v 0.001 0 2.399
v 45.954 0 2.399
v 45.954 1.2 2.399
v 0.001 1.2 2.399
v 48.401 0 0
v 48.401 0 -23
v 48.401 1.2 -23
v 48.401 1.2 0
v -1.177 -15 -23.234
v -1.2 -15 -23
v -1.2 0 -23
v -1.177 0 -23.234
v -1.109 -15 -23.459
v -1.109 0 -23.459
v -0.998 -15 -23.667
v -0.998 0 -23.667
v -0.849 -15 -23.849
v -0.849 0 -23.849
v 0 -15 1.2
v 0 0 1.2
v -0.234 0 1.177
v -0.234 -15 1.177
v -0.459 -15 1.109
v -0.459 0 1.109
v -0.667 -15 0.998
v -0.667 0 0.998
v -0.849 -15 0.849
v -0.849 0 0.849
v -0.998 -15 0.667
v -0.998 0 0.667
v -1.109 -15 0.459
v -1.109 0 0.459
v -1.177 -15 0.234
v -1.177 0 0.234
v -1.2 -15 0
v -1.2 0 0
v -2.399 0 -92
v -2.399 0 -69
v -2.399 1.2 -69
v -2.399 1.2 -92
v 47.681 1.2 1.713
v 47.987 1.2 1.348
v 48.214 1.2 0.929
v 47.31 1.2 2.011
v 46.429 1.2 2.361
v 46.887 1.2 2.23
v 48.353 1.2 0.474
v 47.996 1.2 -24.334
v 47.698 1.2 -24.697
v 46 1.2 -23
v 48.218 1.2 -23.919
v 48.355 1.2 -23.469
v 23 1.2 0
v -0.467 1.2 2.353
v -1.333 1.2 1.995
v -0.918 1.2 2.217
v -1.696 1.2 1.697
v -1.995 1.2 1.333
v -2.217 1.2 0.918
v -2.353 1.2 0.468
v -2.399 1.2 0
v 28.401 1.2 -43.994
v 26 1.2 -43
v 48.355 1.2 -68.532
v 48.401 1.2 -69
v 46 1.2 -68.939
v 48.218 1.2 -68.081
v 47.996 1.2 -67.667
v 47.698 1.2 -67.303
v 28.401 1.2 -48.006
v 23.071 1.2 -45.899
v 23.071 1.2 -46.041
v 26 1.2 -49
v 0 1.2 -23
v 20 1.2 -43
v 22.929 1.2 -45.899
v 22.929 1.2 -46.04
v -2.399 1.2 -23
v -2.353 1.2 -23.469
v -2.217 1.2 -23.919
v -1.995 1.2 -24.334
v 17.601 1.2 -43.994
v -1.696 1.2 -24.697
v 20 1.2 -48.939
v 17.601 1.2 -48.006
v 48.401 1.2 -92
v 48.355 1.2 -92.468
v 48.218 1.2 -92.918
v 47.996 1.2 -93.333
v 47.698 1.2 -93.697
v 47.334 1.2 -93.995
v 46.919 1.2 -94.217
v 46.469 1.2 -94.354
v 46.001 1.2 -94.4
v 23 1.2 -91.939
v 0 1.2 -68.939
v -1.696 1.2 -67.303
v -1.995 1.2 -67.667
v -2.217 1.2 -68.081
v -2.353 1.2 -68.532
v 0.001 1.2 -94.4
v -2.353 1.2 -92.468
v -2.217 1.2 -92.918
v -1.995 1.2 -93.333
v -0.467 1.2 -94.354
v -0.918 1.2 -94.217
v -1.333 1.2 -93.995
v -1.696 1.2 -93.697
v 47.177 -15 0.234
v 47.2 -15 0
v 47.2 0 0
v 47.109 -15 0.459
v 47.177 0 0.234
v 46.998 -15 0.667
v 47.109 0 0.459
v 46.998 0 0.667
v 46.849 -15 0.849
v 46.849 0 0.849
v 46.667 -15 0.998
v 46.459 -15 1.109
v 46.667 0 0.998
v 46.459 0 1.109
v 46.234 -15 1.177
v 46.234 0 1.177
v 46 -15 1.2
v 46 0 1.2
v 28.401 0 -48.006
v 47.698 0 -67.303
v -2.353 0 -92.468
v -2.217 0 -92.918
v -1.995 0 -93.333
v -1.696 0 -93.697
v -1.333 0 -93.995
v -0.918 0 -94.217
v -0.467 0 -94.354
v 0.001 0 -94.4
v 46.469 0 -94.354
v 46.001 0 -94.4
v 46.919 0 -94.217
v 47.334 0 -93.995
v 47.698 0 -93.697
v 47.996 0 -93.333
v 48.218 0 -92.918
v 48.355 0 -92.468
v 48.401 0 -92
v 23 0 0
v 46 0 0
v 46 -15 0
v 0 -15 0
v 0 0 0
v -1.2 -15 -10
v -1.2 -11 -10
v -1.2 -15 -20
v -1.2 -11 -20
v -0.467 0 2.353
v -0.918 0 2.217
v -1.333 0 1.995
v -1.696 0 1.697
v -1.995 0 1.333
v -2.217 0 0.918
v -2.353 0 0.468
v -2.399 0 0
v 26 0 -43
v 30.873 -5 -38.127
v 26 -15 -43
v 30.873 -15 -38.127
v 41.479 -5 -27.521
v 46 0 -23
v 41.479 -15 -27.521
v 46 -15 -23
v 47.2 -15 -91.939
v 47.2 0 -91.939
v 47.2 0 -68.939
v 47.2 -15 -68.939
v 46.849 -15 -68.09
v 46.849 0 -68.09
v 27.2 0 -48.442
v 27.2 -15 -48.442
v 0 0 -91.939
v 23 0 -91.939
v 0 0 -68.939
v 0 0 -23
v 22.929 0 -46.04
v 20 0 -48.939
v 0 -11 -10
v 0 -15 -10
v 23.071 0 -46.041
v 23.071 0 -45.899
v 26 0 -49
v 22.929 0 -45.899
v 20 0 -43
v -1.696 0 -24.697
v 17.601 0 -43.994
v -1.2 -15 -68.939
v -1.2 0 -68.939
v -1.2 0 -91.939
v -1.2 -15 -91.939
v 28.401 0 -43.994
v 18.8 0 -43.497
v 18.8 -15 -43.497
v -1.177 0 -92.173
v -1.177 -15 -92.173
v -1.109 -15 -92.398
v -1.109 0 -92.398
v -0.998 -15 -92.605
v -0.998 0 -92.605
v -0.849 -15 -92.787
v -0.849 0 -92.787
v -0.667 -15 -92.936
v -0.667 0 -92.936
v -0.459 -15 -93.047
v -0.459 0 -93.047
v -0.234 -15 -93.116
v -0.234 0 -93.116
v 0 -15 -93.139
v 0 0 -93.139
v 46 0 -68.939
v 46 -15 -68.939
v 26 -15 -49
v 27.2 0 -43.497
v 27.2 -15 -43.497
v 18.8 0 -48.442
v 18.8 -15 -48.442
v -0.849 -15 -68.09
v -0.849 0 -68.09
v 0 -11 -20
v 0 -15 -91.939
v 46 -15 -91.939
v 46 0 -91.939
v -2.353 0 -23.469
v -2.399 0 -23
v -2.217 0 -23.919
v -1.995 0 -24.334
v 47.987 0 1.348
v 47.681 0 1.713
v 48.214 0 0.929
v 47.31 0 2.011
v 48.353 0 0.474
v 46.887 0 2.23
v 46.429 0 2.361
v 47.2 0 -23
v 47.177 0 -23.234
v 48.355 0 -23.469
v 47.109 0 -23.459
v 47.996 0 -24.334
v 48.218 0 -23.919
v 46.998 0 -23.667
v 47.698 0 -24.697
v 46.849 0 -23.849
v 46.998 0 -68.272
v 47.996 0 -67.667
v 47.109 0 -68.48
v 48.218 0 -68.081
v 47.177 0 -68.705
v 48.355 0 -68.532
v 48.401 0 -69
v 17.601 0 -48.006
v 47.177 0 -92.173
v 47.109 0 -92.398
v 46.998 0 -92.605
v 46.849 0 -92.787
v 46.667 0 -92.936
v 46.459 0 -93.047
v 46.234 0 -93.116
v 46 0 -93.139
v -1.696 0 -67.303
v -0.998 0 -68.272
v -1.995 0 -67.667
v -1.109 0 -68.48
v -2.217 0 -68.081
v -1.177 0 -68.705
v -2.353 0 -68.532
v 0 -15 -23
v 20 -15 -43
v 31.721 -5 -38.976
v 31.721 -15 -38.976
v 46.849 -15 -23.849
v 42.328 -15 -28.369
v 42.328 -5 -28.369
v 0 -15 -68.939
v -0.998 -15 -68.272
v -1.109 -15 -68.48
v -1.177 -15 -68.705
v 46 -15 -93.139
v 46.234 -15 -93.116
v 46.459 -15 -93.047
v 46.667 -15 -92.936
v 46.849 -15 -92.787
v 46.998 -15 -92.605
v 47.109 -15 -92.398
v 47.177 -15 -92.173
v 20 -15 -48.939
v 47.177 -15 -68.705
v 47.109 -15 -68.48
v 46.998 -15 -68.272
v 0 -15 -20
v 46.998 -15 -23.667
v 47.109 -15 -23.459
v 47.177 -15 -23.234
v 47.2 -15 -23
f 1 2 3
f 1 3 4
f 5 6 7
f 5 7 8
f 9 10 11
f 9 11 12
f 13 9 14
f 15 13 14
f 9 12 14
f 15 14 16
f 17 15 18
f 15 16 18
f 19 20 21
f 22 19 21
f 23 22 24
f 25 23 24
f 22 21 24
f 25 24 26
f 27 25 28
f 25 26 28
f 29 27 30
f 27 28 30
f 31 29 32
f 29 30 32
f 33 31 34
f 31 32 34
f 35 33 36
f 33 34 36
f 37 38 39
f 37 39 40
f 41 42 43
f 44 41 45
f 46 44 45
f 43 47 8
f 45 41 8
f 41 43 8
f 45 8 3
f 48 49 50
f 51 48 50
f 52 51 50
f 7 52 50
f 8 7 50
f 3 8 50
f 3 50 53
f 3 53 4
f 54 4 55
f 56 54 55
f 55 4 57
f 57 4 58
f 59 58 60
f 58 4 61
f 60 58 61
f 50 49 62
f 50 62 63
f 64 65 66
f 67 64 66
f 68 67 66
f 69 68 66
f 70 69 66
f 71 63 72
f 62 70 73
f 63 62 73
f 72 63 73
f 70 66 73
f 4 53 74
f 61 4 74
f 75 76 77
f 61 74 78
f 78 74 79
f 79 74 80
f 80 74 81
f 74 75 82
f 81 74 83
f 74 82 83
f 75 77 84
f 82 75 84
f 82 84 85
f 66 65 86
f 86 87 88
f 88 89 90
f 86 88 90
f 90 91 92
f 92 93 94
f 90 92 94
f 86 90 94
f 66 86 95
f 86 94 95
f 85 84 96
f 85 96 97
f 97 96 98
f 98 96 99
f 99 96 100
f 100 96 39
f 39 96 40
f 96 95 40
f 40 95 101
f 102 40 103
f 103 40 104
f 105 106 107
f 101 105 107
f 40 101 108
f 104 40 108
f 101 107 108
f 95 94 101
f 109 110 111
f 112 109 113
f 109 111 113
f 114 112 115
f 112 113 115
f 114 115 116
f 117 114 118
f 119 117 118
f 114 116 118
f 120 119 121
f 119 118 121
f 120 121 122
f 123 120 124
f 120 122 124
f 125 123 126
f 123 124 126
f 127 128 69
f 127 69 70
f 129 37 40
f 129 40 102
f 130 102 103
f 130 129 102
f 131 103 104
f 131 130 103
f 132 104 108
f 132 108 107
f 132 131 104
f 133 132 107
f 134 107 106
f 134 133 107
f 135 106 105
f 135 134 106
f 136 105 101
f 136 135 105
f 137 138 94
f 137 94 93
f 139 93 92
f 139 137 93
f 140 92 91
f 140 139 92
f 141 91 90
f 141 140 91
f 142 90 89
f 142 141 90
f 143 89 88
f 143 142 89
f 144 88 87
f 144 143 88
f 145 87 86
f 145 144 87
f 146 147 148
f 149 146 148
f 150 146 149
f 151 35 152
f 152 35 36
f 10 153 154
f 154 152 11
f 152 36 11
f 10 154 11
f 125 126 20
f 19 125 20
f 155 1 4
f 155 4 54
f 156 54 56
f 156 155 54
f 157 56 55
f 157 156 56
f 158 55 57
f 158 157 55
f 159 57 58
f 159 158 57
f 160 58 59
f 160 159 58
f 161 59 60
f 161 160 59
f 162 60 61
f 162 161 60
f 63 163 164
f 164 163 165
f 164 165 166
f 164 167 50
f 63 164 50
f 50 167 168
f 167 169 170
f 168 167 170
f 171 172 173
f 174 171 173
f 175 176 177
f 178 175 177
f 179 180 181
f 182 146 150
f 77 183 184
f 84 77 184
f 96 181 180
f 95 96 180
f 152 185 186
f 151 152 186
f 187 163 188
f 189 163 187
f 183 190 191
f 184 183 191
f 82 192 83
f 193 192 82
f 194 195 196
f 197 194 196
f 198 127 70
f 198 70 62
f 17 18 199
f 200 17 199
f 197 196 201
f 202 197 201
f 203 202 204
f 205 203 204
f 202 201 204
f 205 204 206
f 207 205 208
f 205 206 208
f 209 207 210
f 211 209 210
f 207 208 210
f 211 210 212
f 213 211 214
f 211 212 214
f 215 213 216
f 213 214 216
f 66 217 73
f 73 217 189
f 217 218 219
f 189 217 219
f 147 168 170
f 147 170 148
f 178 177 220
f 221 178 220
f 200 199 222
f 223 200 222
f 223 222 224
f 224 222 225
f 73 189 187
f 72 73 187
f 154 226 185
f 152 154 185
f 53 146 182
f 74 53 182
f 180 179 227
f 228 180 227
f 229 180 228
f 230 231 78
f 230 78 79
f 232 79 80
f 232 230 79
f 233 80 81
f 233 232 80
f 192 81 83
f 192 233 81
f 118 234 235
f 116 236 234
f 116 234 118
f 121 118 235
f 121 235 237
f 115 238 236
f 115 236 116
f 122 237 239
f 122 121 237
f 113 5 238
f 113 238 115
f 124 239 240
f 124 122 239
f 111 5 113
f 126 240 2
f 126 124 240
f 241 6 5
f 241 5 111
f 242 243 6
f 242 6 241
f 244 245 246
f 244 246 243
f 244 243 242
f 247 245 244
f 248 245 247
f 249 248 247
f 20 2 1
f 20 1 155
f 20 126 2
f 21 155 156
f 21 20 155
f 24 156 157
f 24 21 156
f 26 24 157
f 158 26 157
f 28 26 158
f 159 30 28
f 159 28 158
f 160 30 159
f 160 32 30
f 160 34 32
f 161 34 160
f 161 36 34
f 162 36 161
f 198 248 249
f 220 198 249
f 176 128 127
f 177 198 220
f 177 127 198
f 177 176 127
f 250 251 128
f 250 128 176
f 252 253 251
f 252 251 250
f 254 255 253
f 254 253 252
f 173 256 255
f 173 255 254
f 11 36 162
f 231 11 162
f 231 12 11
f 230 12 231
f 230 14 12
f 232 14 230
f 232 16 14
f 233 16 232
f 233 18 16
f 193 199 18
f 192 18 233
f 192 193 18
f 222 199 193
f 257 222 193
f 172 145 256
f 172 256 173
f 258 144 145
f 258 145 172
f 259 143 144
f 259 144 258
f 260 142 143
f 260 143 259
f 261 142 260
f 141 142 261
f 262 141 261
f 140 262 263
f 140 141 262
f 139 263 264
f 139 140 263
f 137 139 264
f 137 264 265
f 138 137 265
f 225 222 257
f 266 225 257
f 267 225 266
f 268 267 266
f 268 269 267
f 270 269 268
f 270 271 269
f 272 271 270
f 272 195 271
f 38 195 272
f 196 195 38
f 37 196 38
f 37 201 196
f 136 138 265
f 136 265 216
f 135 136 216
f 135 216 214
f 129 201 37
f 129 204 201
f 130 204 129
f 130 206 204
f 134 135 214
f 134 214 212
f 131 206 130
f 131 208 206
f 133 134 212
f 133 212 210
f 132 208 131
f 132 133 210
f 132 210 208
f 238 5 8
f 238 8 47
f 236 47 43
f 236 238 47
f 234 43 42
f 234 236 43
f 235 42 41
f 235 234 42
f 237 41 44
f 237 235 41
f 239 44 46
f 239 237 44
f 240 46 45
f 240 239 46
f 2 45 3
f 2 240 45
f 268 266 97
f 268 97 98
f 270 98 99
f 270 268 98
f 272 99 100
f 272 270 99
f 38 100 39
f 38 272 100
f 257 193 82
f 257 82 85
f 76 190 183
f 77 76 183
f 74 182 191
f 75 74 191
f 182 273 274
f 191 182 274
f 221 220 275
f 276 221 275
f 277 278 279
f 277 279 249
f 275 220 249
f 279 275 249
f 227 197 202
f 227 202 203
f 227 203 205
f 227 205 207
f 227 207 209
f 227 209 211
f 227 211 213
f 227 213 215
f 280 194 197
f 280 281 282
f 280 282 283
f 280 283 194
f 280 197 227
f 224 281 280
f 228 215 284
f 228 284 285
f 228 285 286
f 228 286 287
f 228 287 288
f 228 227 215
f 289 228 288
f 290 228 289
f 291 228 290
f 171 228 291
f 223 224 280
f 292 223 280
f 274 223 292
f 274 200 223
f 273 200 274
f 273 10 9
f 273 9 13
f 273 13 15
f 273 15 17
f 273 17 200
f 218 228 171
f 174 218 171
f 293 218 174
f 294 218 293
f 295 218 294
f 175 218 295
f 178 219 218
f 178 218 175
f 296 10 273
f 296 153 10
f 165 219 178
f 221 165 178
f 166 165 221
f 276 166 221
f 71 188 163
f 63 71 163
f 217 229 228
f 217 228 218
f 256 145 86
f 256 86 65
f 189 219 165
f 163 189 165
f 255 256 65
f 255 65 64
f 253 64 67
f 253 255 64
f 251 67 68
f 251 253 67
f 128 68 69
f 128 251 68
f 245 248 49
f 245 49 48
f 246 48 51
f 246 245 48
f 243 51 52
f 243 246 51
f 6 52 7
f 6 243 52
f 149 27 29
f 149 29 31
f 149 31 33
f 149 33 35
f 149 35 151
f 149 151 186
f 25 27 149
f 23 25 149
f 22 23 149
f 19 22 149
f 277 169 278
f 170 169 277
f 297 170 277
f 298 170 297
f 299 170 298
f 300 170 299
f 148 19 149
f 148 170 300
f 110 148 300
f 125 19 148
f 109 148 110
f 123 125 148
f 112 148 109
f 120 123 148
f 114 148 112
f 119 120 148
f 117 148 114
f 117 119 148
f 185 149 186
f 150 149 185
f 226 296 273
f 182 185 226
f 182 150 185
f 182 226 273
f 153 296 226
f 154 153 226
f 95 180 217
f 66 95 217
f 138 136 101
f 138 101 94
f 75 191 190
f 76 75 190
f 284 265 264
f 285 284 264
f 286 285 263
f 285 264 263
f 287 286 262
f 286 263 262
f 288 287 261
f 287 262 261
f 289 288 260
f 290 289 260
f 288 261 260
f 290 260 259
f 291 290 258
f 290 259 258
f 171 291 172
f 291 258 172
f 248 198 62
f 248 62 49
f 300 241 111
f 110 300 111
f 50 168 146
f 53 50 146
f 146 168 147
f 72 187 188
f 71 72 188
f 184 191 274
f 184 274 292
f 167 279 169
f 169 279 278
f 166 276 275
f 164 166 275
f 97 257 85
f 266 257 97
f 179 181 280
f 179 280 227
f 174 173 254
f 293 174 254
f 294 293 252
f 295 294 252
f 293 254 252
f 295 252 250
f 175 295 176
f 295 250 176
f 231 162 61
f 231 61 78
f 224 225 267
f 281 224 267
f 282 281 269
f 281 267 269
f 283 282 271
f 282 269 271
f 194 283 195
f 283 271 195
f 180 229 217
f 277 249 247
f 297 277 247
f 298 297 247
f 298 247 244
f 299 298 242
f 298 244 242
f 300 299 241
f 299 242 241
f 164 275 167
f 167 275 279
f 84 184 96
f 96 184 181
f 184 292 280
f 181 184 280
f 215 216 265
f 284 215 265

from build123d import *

# Parameters (mm, degrees)
EXTRUDE_2_DEPTH      = 1.2
EXTRUDE_4_DEPTH      = 15
CUT_EXTRUDE_13_REACH = 109.14
CUT_EXTRUDE_15_REACH = 109.14
CUT_EXTRUDE_16_REACH = 109.14
CUT_EXTRUDE_17_REACH = 73.673


with BuildPart() as part:
    # 草图1 → 凸台-拉伸2 (new body)
    with BuildSketch(Plane(origin=(0, 0, 0), x_dir=(1, 0, 0), z_dir=(0, 1, 0))):
        with BuildLine():
            Line((-2.399264051, 68.999900529), (-2.399264051, 91.999900529))
            ThreePointArc((-2.399264051, 91.999900529), (-1.696320326, 93.696956804), (0.000735949, 94.399900529))
            Line((0.000735949, 94.399900529), (46.000735949, 94.399900529))
            ThreePointArc((46.000735949, 94.399900529), (47.697792224, 93.696956804), (48.400735949, 91.999900529))
            Line((48.400735949, 91.999900529), (48.400735949, 68.999900529))
            ThreePointArc((48.400735949, 68.999900529), (48.218046827, 68.081460292), (47.697792224, 67.302844254))
            Line((47.697792224, 67.302844254), (28.40092775, 48.00597978))
            Line((28.40092775, 48.00597978), (28.40092775, 43.99420488))
            Line((28.40092775, 43.99420488), (47.697792224, 24.697340406))
            ThreePointArc((47.697792224, 24.697340406), (48.218046827, 23.918724369), (48.400735949, 23.000284131))
            Line((48.400735949, 23.000284131), (48.400735949, 0.000284131))
            ThreePointArc((48.400735949, 0.000284131), (47.681245751, -1.713158837), (45.954163612, -2.399263955))
            Line((45.954163612, -2.399263955), (0.000735672, -2.399263955))
            ThreePointArc((0.000735672, -2.399263955), (-1.696376241, -1.696695528), (-2.399264051, 0.000284131))
            Line((-2.399264051, 0.000284131), (-2.399264051, 23.000284131))
            ThreePointArc((-2.399264051, 23.000284131), (-2.216574929, 23.918724369), (-1.696320326, 24.697340406))
            Line((-1.696320326, 24.697340406), (17.600544148, 43.99420488))
            Line((17.600544148, 43.99420488), (17.600544148, 48.00597978))
            Line((17.600544148, 48.00597978), (-1.696320326, 67.302844254))
            ThreePointArc((-1.696320326, 67.302844254), (-2.216574929, 68.081460292), (-2.399264051, 68.999900529))
        make_face()
    extrude(amount=EXTRUDE_2_DEPTH)

    # 草图3 → 凸台-拉伸4 (add)
    with BuildSketch(Plane.XZ):
        with BuildLine():
            Line((0, -93.138725211), (46, -93.138725211))
            ThreePointArc((46, -93.138725211), (46.848528137, -92.787253348), (47.2, -91.938725211))
            Line((47.2, -91.938725211), (47.2, -68.938725211))
            ThreePointArc((47.2, -68.938725211), (47.108655439, -68.479505092), (46.848528137, -68.090197073))
            Line((46.848528137, -68.090197073), (27.200191801, -48.441860737))
            Line((27.200191801, -48.441860737), (27.200191801, -43.496864474))
            Line((27.200191801, -43.496864474), (46.848528137, -23.848528137))
            ThreePointArc((46.848528137, -23.848528137), (47.108655439, -23.459220119), (47.2, -23))
            Line((47.2, -23), (47.2, 0))
            ThreePointArc((47.2, 0), (46.848528137, 0.848528137), (46, 1.2))
            Line((46, 1.2), (0, 1.2))
            ThreePointArc((0, 1.2), (-0.848528137, 0.848528137), (-1.2, 0))
            Line((-1.2, 0), (-1.2, -23))
            ThreePointArc((-1.2, -23), (-1.108655439, -23.459220119), (-0.848528137, -23.848528137))
            Line((-0.848528137, -23.848528137), (18.799808199, -43.496864474))
            Line((18.799808199, -43.496864474), (18.799808199, -48.441860737))
            Line((18.799808199, -48.441860737), (-0.848528137, -68.090197073))
            ThreePointArc((-0.848528137, -68.090197073), (-1.108655439, -68.479505092), (-1.2, -68.938725211))
            Line((-1.2, -68.938725211), (-1.2, -91.938725211))
            ThreePointArc((-1.2, -91.938725211), (-0.848528137, -92.787253348), (0, -93.138725211))
        make_face()
        Polygon((0, -23), (19.999808199, -42.999808199), (19.999808199, -48.938917012), (0, -68.938725211), (0, -91.938725211), (46, -91.938725211), (46, -68.938725211), (26.000191801, -48.999808199), (26.000191801, -42.999808199), (46, -23), (46, 0), (0, 0), align=None, mode=Mode.SUBTRACT)
    extrude(amount=EXTRUDE_4_DEPTH)

    # 草图11 → 切除-拉伸13 (cut, up to next)
    with BuildSketch(Plane(origin=(0, 0, 0), x_dir=(-1, 0, 0), z_dir=(0, -1, 0)), mode=Mode.PRIVATE) as cut_extrude_13_sk1:
        Polygon((-19.999808199, 42.999808199), (-23, 45.969362605), (-26.000191801, 42.999808199), (-46, 23), (-23, 0), (0, 23), align=None)
    cut_extrude_13_tool1 = extrude(cut_extrude_13_sk1.sketch, amount=-CUT_EXTRUDE_13_REACH, mode=Mode.PRIVATE) & part.part
    add(cut_extrude_13_tool1.solids().sort_by_distance((23, 0, -22.998089))[0], mode=Mode.SUBTRACT)

    # 草图16 → 切除-拉伸15 (cut, up to next)
    with BuildSketch(Plane.XZ, mode=Mode.PRIVATE) as cut_extrude_15_sk1:
        Polygon((0, -68.938725211), (23, -91.938725211), (46, -68.938725211), (26.000191801, -48.999808199), (23.071072637, -46.041151936), (23.071072637, -45.899015749), (22.928927363, -45.899015749), (22.928927363, -46.039709462), (19.999808199, -48.938917012), align=None)
    cut_extrude_15_tool1 = extrude(cut_extrude_15_sk1.sketch, amount=-CUT_EXTRUDE_15_REACH, mode=Mode.PRIVATE) & part.part
    add(cut_extrude_15_tool1.solids().sort_by_distance((22.99426, 0, -68.949789))[0], mode=Mode.SUBTRACT)

    # 草图17 → 切除-拉伸16 (cut, up to next)
    with BuildSketch(Plane(origin=(0, 0, 0), x_dir=(0, 0, -1), z_dir=(1, 0, 0)), mode=Mode.PRIVATE) as cut_extrude_16_sk1:
        Polygon((10, -11), (10, -15), (15, -15), (20, -15), (20, -11), (15, -11), align=None)
    cut_extrude_16_tool1 = extrude(cut_extrude_16_sk1.sketch, amount=-CUT_EXTRUDE_16_REACH, mode=Mode.PRIVATE) & part.part
    add(cut_extrude_16_tool1.solids().sort_by_distance((0, -13, -15))[0], mode=Mode.SUBTRACT)

    # 草图18 → 切除-拉伸17 (cut, up to next)
    with BuildSketch(Plane(origin=(35.348528137, 0, -35.348528137), x_dir=(-0.707106781186532, 0, -0.707106781186563), z_dir=(0.707106781186563, 0, -0.707106781186532)), mode=Mode.PRIVATE) as cut_extrude_17_sk1:
        Polygon((-2.369984105, -15), (5.130015895, -15), (5.130015895, -5), (-9.869984105, -5), (-9.869984105, -15), align=None)
    cut_extrude_17_tool1 = extrude(cut_extrude_17_sk1.sketch, amount=-CUT_EXTRUDE_17_REACH, mode=Mode.PRIVATE) & part.part
    add(cut_extrude_17_tool1.solids().sort_by_distance((37.02436, -10, -33.672696))[0], mode=Mode.SUBTRACT)


solid = part.part
